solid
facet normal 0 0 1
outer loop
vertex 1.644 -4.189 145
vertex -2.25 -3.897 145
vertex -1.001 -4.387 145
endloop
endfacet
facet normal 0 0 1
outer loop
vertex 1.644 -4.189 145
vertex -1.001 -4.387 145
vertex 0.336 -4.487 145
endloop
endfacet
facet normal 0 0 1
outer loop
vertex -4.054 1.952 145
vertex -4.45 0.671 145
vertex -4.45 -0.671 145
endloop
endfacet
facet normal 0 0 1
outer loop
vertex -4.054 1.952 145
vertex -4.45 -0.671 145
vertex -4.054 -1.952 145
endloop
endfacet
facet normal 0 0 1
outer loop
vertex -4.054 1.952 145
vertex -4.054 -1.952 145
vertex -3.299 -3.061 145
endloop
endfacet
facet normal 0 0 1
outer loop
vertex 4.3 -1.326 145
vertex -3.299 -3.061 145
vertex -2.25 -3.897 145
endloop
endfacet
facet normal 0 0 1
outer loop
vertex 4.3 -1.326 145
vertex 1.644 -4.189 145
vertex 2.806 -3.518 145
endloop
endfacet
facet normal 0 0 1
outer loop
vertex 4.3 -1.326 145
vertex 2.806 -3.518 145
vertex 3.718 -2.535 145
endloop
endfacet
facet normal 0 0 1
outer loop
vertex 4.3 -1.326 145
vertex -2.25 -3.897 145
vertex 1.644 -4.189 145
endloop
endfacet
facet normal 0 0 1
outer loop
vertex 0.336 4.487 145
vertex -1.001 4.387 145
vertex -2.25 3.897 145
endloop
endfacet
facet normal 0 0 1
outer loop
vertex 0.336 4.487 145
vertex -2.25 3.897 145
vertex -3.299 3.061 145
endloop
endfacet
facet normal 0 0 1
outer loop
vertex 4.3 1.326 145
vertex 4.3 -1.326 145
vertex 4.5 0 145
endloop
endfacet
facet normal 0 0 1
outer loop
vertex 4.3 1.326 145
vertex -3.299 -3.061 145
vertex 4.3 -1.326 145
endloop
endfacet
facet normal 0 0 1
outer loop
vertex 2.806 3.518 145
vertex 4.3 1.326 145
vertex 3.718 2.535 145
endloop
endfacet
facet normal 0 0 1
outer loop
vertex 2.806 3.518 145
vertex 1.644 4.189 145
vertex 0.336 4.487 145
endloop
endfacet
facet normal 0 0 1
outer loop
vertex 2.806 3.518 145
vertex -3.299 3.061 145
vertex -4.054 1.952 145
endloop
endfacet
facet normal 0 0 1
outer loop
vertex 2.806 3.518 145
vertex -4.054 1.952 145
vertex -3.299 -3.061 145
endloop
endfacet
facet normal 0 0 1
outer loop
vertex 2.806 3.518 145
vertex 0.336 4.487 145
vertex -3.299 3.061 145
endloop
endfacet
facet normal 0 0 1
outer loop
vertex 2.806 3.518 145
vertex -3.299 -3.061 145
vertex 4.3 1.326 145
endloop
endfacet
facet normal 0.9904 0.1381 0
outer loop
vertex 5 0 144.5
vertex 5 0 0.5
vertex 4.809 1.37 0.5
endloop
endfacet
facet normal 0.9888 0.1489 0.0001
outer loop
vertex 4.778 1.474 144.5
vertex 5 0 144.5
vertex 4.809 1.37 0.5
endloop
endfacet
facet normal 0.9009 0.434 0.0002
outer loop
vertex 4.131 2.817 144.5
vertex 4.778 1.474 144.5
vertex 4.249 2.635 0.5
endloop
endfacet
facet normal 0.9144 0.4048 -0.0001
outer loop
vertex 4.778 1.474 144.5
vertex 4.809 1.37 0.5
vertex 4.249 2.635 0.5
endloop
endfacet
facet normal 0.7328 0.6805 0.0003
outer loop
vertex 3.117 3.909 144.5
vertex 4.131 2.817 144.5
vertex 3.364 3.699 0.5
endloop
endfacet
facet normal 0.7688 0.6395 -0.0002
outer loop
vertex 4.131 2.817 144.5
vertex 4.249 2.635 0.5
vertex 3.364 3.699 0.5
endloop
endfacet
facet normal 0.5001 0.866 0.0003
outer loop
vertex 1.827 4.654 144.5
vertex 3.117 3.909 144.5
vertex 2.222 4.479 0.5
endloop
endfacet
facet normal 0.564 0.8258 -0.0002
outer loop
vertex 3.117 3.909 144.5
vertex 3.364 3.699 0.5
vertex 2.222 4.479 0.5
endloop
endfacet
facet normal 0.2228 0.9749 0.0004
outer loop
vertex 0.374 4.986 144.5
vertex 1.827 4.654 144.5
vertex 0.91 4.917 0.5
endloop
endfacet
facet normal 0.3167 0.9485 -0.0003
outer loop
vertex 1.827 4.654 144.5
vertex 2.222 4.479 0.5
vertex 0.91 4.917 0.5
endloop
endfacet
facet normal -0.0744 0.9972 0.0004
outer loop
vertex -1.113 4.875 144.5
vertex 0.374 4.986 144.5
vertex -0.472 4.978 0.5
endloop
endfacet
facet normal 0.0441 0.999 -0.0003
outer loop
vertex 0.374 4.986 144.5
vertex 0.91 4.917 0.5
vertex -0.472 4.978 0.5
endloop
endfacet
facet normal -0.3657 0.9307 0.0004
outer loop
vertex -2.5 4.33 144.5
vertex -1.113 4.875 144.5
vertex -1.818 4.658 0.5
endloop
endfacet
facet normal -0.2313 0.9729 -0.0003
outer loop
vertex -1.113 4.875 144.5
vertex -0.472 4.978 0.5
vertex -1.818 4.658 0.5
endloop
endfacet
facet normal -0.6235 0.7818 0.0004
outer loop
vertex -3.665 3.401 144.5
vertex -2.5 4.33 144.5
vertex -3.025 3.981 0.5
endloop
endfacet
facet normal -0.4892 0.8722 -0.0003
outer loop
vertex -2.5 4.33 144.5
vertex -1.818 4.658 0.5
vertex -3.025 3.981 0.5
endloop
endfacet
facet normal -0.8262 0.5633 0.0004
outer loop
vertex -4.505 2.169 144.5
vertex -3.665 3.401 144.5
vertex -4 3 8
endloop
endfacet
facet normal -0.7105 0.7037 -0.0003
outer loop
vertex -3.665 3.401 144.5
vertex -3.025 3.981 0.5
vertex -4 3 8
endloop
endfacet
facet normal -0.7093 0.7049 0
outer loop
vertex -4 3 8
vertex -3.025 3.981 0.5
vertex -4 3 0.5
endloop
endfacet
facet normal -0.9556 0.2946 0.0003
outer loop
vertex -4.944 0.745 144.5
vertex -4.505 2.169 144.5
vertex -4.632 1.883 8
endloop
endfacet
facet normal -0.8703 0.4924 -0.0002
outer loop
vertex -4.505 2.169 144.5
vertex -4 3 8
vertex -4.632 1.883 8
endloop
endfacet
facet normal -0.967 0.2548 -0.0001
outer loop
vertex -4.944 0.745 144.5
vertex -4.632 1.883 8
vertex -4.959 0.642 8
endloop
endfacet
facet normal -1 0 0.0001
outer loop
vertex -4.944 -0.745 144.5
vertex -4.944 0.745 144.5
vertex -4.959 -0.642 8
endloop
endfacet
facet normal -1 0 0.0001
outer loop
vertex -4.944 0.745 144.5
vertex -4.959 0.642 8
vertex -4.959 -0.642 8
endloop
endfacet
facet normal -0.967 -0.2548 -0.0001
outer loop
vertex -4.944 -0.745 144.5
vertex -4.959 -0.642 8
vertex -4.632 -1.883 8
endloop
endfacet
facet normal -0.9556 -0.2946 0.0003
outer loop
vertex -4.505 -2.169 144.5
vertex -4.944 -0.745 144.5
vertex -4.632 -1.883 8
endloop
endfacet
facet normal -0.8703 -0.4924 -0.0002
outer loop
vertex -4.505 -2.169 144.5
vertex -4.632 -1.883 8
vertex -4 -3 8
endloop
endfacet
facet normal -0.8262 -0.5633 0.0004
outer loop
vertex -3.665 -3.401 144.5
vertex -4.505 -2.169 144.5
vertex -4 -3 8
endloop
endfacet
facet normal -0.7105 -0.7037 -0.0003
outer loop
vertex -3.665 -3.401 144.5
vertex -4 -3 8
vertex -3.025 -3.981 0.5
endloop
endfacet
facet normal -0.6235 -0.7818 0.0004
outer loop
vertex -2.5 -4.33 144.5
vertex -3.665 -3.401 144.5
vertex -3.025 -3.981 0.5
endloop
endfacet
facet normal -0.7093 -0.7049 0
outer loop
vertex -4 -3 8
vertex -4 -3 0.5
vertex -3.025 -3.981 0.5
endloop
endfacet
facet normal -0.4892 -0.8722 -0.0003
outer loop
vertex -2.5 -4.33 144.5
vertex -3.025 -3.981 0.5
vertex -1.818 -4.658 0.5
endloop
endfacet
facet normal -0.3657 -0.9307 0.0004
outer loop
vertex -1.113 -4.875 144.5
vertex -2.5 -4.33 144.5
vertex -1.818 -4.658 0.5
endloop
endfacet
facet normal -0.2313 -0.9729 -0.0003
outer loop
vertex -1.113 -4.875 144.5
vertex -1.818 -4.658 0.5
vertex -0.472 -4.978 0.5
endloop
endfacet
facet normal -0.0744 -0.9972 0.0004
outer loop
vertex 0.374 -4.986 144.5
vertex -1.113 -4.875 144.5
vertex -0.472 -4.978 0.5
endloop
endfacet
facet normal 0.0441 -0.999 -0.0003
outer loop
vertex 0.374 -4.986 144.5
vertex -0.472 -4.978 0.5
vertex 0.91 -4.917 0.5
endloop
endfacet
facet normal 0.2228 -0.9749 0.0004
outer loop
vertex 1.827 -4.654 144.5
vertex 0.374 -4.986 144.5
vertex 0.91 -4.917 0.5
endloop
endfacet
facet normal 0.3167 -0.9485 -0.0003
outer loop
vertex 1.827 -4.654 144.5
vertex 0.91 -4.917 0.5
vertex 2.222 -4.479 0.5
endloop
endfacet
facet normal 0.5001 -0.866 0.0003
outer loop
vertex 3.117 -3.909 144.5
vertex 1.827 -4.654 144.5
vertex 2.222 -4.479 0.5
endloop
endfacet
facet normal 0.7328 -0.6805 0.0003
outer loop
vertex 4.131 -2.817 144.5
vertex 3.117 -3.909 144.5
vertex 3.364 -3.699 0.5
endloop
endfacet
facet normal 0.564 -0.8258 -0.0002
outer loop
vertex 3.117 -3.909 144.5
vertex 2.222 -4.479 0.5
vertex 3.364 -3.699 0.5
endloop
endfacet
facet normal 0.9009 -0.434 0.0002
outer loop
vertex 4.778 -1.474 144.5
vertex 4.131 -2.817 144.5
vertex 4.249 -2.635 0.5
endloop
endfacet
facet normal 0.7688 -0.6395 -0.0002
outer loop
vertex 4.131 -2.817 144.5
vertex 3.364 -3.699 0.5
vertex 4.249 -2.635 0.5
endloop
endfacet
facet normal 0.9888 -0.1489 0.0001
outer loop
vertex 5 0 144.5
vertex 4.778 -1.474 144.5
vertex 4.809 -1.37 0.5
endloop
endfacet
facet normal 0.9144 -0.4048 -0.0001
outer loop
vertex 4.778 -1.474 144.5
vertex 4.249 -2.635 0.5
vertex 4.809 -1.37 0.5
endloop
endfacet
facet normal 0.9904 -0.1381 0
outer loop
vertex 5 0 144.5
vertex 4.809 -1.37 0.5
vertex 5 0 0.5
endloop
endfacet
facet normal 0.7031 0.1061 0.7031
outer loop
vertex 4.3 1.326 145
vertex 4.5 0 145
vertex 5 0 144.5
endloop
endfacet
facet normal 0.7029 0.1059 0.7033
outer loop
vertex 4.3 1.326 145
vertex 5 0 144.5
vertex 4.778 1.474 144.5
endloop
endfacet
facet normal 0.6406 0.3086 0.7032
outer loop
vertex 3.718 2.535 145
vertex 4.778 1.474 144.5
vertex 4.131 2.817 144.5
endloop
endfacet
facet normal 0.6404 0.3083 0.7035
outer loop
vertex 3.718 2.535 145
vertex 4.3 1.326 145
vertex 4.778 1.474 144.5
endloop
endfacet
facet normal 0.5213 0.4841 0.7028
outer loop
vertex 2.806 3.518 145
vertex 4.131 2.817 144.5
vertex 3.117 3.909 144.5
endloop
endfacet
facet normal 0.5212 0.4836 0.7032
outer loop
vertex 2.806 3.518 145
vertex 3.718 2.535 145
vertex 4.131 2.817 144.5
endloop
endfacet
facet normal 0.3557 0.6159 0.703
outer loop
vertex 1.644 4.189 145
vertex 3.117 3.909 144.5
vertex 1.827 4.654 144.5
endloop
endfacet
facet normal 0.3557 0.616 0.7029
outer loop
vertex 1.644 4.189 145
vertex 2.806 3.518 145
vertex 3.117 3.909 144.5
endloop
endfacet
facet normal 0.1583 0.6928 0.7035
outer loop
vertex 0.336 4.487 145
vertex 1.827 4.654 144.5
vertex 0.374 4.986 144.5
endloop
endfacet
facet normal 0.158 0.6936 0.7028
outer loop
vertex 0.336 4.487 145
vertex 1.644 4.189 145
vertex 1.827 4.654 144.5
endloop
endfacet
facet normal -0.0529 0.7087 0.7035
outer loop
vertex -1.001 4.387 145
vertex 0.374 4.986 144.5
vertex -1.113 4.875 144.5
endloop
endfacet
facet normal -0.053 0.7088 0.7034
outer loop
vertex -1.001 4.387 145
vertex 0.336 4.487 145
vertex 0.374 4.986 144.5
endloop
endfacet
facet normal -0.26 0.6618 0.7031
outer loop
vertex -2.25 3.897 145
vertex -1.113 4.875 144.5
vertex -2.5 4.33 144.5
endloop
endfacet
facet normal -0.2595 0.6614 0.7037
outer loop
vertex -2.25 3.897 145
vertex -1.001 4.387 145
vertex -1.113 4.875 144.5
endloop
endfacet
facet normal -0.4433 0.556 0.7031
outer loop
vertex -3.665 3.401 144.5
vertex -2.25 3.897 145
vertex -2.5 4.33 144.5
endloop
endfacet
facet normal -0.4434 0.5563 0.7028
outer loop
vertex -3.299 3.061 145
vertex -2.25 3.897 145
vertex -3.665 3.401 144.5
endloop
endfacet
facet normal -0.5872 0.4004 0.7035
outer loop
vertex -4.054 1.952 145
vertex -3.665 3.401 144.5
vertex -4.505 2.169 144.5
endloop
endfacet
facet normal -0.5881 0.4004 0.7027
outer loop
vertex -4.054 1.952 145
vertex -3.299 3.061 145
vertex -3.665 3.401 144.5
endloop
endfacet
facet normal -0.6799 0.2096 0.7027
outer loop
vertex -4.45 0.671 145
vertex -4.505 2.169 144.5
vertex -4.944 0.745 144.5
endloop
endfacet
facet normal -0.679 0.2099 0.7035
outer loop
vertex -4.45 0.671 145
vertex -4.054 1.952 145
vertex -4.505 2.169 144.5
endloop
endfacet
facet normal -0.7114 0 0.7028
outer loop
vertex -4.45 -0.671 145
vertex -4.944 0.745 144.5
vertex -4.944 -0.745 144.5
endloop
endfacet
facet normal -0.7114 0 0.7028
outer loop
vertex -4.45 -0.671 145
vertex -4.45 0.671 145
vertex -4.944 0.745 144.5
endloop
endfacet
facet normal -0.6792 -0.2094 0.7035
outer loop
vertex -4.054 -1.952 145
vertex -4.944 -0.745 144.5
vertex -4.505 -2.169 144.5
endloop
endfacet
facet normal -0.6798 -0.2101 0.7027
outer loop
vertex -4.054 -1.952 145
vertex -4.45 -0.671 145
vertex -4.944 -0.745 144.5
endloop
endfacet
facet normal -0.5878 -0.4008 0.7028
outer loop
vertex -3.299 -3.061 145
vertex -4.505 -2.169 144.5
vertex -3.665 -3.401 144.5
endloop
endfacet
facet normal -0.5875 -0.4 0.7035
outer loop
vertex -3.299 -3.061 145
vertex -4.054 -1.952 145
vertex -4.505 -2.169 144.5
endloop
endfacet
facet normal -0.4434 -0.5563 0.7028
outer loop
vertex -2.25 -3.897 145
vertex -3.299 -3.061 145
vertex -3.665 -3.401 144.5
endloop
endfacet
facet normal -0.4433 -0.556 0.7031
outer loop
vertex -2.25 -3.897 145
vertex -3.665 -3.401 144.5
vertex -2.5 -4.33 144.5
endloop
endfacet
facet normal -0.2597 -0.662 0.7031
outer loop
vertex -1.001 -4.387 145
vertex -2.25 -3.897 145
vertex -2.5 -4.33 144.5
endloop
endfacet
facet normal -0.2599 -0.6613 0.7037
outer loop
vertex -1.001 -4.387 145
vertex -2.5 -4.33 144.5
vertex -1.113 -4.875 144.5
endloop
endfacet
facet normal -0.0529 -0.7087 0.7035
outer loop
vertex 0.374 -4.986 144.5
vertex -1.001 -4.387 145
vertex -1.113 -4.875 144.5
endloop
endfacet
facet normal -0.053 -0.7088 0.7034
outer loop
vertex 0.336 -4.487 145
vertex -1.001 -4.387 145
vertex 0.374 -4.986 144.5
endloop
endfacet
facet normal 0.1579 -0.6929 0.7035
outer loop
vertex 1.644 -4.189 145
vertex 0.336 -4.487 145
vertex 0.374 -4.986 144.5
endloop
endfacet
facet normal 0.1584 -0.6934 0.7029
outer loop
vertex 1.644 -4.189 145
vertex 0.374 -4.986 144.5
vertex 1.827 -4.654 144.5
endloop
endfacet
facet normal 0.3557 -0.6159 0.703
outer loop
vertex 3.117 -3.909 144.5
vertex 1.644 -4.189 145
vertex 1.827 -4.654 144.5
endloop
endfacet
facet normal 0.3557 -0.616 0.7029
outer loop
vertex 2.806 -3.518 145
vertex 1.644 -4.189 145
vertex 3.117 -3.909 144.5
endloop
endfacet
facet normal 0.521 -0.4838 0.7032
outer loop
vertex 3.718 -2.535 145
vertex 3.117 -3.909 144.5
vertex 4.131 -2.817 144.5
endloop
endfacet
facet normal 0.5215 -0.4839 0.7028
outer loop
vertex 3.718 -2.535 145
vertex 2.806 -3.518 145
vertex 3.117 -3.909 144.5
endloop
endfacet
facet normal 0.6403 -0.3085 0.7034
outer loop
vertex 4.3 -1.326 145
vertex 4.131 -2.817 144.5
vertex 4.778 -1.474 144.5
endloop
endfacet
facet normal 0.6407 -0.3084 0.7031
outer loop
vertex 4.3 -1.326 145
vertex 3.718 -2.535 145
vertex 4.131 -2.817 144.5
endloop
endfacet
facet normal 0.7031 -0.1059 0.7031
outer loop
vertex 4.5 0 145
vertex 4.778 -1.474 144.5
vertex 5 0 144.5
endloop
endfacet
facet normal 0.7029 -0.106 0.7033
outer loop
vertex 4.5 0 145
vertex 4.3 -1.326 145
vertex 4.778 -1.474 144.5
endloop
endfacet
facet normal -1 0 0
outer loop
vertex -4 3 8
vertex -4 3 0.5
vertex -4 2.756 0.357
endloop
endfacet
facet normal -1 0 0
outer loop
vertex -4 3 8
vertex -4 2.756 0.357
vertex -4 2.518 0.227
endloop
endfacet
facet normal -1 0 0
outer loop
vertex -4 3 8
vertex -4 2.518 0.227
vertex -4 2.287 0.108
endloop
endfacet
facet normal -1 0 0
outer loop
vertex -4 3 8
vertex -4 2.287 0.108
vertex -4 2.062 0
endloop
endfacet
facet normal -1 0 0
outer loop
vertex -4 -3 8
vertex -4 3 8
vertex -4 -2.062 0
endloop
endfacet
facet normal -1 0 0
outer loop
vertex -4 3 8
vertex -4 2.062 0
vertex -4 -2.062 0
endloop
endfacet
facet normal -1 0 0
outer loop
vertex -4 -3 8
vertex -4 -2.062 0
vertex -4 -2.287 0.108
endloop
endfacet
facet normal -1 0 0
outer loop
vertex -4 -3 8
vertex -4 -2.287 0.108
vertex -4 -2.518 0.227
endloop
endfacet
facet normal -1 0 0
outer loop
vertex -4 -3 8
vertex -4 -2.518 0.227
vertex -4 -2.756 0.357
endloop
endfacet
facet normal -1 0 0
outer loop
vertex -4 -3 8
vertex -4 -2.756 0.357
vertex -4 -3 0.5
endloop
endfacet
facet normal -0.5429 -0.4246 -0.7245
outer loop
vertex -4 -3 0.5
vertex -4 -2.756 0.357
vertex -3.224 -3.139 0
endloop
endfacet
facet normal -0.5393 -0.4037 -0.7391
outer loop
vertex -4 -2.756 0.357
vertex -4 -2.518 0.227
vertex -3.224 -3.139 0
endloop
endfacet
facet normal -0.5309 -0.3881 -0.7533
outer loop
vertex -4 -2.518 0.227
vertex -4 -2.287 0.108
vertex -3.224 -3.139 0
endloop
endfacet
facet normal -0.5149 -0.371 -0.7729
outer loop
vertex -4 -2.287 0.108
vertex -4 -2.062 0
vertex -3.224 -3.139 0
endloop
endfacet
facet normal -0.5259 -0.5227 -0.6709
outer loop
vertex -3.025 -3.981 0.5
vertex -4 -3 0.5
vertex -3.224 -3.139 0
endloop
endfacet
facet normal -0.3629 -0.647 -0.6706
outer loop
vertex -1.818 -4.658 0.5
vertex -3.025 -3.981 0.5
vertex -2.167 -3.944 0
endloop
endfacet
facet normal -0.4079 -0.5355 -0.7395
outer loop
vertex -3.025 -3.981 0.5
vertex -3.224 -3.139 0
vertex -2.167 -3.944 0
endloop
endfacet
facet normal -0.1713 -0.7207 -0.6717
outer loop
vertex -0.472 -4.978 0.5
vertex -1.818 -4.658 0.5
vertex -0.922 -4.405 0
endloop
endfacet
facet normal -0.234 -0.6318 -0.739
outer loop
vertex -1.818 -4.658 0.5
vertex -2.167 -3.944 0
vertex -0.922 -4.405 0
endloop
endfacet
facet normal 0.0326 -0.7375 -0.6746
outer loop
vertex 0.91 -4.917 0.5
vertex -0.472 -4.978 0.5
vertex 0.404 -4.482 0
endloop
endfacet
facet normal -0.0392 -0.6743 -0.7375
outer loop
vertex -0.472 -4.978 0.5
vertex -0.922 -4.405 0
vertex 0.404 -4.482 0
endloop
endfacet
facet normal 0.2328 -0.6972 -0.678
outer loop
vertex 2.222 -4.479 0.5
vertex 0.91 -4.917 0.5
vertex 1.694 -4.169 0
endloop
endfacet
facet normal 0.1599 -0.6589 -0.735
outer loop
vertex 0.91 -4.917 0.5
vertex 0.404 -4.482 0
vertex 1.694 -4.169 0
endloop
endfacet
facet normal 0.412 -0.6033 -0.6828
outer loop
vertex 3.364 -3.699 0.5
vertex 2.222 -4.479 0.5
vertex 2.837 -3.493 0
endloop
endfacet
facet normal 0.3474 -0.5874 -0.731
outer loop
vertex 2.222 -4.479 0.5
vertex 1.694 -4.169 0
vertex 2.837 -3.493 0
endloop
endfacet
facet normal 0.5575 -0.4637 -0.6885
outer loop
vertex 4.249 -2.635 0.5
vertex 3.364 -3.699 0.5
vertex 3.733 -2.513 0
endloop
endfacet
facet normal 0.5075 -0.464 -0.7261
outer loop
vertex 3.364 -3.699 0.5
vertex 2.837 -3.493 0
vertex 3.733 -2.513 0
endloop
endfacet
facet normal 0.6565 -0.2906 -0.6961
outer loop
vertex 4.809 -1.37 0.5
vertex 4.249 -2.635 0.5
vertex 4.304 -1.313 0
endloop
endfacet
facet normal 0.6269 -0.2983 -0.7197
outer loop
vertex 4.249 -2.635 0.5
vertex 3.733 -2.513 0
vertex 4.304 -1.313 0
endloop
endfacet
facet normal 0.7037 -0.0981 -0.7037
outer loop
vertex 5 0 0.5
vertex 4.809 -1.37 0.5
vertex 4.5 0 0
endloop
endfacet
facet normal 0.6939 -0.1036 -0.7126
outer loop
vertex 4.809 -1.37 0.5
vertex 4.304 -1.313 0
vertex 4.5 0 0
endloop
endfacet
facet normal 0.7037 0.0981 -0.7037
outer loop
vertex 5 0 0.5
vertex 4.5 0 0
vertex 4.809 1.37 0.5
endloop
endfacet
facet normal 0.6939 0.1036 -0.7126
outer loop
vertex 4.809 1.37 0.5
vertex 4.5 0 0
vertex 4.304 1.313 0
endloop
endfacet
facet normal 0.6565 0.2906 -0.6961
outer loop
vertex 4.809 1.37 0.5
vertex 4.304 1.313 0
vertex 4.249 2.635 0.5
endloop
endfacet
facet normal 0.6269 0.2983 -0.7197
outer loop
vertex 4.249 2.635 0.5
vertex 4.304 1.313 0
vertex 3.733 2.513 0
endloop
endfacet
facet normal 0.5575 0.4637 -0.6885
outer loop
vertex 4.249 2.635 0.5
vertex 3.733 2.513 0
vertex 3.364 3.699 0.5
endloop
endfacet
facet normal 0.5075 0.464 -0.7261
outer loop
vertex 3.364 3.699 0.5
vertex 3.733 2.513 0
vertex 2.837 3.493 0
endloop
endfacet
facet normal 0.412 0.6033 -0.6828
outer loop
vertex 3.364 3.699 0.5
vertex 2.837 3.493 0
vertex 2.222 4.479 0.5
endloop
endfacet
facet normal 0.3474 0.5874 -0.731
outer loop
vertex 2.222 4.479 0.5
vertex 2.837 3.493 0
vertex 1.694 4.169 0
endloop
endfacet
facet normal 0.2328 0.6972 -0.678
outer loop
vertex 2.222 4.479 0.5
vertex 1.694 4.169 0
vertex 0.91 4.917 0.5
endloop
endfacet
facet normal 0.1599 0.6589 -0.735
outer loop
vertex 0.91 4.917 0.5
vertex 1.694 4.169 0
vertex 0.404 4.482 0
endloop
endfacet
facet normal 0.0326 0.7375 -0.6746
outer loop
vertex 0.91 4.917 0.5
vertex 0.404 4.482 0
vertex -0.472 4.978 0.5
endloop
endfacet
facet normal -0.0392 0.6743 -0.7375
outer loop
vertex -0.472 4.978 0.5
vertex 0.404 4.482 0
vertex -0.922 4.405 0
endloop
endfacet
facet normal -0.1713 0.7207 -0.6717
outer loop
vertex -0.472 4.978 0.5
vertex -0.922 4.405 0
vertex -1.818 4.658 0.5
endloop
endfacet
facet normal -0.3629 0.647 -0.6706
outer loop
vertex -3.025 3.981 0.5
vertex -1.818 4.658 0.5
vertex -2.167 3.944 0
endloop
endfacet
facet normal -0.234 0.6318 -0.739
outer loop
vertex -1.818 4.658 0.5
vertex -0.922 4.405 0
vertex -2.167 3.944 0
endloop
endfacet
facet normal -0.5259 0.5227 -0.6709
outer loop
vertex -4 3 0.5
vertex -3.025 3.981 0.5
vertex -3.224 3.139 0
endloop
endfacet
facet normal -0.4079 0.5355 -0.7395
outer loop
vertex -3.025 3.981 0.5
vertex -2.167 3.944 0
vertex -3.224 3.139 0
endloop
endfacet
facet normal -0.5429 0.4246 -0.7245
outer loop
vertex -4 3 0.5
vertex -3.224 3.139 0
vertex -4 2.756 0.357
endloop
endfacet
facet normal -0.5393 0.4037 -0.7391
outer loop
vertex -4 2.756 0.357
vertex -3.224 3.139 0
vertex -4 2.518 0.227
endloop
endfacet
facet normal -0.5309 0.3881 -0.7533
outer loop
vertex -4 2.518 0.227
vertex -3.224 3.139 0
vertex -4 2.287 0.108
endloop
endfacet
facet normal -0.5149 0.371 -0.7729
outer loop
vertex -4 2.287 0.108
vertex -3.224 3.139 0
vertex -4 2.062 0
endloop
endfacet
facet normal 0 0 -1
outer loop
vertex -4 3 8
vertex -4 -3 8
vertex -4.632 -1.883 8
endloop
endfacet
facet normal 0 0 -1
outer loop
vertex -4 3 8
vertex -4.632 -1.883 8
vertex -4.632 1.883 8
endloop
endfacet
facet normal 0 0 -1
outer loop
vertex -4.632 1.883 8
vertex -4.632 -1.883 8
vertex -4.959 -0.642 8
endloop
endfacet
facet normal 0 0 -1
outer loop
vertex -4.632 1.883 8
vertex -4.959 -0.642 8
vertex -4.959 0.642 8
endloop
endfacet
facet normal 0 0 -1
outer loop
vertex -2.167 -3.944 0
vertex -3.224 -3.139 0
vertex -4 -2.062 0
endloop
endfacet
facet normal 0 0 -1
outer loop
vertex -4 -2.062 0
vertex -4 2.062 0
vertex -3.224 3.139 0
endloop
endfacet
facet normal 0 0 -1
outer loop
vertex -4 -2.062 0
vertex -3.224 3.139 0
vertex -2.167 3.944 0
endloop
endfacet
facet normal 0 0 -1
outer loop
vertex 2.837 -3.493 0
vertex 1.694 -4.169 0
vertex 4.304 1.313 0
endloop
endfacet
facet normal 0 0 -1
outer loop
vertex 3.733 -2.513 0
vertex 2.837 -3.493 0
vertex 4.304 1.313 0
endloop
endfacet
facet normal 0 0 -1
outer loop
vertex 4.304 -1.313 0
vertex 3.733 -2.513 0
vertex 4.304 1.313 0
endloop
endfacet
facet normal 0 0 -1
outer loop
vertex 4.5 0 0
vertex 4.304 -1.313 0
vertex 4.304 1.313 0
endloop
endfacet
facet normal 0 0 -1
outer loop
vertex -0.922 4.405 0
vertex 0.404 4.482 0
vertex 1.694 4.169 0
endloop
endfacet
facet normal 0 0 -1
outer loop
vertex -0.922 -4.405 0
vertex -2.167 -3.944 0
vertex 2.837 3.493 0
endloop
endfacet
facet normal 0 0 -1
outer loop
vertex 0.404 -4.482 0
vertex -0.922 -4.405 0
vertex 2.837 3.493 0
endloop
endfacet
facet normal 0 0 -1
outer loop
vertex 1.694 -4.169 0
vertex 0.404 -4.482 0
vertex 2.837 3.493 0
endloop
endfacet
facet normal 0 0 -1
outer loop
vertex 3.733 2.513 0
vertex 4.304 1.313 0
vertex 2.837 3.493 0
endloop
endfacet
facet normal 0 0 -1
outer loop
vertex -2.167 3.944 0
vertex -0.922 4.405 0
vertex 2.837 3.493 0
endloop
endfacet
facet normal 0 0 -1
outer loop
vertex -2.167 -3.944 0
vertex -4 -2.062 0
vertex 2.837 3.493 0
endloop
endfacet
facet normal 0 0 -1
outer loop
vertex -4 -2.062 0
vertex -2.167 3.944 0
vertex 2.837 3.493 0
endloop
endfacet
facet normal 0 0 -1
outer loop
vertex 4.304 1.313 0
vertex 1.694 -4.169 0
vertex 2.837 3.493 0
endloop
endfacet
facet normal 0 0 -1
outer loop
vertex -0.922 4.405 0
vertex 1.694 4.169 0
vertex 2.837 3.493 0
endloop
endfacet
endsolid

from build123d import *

# Parameters (mm, degrees)
SKETCH1_R           = 5
BOSS_EXTRUDE1_DEPTH = 145
CUT_EXTRUDE1_DEPTH  = 8
CHAMFER1_SIZE       = 0.5


with BuildPart() as part:
    # Sketch1 → Boss-Extrude1 (new body)
    with BuildSketch(Plane.XY):
        Circle(SKETCH1_R)
    extrude(amount=BOSS_EXTRUDE1_DEPTH)

    # Sketch2 → Cut-Extrude1 (cut)
    with BuildSketch(Plane(origin=(0, 0, 0), x_dir=(-1, 0, 0), z_dir=(0, 0, -1))):
        with BuildLine():
            Line((4, 3), (4, -3))
            ThreePointArc((4, -3), (5, 0), (4, 3))
        make_face()
    extrude(amount=-CUT_EXTRUDE1_DEPTH, mode=Mode.SUBTRACT)

    # Chamfer1
    chamfer1_edges = [part.edges().sort_by_distance(p)[0] for p in [
        (-5, 0, 145),
        (1.58113883, 4.74341649, 0),
    ]]
    chamfer(chamfer1_edges, length=CHAMFER1_SIZE)


solid = part.part
